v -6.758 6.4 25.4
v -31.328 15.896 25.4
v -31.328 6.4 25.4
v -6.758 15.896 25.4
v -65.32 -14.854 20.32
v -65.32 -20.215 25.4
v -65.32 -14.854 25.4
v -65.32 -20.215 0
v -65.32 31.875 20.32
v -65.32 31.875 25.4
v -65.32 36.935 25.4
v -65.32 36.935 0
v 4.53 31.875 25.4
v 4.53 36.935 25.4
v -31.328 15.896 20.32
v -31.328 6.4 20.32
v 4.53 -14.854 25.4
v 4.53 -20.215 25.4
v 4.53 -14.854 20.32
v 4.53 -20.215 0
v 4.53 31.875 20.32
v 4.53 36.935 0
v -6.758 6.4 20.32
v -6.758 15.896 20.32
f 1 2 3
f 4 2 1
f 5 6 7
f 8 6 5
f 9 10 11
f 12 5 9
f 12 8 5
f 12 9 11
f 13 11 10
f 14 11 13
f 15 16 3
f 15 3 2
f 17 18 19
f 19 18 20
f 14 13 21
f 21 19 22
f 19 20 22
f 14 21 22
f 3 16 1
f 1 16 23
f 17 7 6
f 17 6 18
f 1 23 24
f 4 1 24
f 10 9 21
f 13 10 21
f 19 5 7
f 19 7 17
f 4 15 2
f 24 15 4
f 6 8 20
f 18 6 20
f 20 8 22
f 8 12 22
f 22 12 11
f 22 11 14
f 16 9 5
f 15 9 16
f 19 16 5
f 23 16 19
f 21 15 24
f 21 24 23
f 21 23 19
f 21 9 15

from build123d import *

# Parameters (mm, degrees)
F0_W     = 69.85
F0_H     = 46.728912
F0_R     = 3.018536
F0_W_2   = 24.570362
F0_H_2   = 9.496521
F1_DEPTH = 20.32
F0_H_3   = 5.360574
F0_H_4   = 5.060514
F2_DEPTH = 25.4


with BuildPart() as f1:
    # F0 (on Top) → F1 (new body)
    with BuildSketch(Plane.XY):
        with Locations((-30.394862, 8.510193)):
            Rectangle(F0_W, F0_H)
        with Locations((-56.652177, -5.056264)):
            Circle(F0_R, mode=Mode.SUBTRACT)
        with BuildLine():
            ThreePointArc((-47.310162, -5.056264), (-50.471902, -8.218004), (-53.633642, -5.056264))
            ThreePointArc((-53.633642, -5.056264), (-50.471902, -1.894525), (-47.310162, -5.056264))
        make_face(mode=Mode.SUBTRACT)
        with Locations((-19.042942, 11.148115)):
            Rectangle(F0_W_2, F0_H_2, mode=Mode.SUBTRACT)
        with Locations((-56.652177, -5.056264)):
            Circle(F0_R)
        with BuildLine():
            ThreePointArc((-47.310162, -5.056264), (-50.471902, -1.894525), (-53.633642, -5.056264))
            ThreePointArc((-53.633642, -5.056264), (-50.471902, -8.218004), (-47.310162, -5.056264))
        make_face()
    extrude(amount=F1_DEPTH)

    # F0 (on Top) → F2 (join)
    with BuildSketch(Plane.XY):
        with Locations((-19.042942, 11.148115)):
            Rectangle(F0_W_2, F0_H_2)
        with Locations((-30.394862, -17.53455)):
            Rectangle(F0_W, F0_H_3)
        with Locations((-30.394862, 34.404906)):
            Rectangle(F0_W, F0_H_4)
    extrude(amount=F2_DEPTH)


solid = f1.part
